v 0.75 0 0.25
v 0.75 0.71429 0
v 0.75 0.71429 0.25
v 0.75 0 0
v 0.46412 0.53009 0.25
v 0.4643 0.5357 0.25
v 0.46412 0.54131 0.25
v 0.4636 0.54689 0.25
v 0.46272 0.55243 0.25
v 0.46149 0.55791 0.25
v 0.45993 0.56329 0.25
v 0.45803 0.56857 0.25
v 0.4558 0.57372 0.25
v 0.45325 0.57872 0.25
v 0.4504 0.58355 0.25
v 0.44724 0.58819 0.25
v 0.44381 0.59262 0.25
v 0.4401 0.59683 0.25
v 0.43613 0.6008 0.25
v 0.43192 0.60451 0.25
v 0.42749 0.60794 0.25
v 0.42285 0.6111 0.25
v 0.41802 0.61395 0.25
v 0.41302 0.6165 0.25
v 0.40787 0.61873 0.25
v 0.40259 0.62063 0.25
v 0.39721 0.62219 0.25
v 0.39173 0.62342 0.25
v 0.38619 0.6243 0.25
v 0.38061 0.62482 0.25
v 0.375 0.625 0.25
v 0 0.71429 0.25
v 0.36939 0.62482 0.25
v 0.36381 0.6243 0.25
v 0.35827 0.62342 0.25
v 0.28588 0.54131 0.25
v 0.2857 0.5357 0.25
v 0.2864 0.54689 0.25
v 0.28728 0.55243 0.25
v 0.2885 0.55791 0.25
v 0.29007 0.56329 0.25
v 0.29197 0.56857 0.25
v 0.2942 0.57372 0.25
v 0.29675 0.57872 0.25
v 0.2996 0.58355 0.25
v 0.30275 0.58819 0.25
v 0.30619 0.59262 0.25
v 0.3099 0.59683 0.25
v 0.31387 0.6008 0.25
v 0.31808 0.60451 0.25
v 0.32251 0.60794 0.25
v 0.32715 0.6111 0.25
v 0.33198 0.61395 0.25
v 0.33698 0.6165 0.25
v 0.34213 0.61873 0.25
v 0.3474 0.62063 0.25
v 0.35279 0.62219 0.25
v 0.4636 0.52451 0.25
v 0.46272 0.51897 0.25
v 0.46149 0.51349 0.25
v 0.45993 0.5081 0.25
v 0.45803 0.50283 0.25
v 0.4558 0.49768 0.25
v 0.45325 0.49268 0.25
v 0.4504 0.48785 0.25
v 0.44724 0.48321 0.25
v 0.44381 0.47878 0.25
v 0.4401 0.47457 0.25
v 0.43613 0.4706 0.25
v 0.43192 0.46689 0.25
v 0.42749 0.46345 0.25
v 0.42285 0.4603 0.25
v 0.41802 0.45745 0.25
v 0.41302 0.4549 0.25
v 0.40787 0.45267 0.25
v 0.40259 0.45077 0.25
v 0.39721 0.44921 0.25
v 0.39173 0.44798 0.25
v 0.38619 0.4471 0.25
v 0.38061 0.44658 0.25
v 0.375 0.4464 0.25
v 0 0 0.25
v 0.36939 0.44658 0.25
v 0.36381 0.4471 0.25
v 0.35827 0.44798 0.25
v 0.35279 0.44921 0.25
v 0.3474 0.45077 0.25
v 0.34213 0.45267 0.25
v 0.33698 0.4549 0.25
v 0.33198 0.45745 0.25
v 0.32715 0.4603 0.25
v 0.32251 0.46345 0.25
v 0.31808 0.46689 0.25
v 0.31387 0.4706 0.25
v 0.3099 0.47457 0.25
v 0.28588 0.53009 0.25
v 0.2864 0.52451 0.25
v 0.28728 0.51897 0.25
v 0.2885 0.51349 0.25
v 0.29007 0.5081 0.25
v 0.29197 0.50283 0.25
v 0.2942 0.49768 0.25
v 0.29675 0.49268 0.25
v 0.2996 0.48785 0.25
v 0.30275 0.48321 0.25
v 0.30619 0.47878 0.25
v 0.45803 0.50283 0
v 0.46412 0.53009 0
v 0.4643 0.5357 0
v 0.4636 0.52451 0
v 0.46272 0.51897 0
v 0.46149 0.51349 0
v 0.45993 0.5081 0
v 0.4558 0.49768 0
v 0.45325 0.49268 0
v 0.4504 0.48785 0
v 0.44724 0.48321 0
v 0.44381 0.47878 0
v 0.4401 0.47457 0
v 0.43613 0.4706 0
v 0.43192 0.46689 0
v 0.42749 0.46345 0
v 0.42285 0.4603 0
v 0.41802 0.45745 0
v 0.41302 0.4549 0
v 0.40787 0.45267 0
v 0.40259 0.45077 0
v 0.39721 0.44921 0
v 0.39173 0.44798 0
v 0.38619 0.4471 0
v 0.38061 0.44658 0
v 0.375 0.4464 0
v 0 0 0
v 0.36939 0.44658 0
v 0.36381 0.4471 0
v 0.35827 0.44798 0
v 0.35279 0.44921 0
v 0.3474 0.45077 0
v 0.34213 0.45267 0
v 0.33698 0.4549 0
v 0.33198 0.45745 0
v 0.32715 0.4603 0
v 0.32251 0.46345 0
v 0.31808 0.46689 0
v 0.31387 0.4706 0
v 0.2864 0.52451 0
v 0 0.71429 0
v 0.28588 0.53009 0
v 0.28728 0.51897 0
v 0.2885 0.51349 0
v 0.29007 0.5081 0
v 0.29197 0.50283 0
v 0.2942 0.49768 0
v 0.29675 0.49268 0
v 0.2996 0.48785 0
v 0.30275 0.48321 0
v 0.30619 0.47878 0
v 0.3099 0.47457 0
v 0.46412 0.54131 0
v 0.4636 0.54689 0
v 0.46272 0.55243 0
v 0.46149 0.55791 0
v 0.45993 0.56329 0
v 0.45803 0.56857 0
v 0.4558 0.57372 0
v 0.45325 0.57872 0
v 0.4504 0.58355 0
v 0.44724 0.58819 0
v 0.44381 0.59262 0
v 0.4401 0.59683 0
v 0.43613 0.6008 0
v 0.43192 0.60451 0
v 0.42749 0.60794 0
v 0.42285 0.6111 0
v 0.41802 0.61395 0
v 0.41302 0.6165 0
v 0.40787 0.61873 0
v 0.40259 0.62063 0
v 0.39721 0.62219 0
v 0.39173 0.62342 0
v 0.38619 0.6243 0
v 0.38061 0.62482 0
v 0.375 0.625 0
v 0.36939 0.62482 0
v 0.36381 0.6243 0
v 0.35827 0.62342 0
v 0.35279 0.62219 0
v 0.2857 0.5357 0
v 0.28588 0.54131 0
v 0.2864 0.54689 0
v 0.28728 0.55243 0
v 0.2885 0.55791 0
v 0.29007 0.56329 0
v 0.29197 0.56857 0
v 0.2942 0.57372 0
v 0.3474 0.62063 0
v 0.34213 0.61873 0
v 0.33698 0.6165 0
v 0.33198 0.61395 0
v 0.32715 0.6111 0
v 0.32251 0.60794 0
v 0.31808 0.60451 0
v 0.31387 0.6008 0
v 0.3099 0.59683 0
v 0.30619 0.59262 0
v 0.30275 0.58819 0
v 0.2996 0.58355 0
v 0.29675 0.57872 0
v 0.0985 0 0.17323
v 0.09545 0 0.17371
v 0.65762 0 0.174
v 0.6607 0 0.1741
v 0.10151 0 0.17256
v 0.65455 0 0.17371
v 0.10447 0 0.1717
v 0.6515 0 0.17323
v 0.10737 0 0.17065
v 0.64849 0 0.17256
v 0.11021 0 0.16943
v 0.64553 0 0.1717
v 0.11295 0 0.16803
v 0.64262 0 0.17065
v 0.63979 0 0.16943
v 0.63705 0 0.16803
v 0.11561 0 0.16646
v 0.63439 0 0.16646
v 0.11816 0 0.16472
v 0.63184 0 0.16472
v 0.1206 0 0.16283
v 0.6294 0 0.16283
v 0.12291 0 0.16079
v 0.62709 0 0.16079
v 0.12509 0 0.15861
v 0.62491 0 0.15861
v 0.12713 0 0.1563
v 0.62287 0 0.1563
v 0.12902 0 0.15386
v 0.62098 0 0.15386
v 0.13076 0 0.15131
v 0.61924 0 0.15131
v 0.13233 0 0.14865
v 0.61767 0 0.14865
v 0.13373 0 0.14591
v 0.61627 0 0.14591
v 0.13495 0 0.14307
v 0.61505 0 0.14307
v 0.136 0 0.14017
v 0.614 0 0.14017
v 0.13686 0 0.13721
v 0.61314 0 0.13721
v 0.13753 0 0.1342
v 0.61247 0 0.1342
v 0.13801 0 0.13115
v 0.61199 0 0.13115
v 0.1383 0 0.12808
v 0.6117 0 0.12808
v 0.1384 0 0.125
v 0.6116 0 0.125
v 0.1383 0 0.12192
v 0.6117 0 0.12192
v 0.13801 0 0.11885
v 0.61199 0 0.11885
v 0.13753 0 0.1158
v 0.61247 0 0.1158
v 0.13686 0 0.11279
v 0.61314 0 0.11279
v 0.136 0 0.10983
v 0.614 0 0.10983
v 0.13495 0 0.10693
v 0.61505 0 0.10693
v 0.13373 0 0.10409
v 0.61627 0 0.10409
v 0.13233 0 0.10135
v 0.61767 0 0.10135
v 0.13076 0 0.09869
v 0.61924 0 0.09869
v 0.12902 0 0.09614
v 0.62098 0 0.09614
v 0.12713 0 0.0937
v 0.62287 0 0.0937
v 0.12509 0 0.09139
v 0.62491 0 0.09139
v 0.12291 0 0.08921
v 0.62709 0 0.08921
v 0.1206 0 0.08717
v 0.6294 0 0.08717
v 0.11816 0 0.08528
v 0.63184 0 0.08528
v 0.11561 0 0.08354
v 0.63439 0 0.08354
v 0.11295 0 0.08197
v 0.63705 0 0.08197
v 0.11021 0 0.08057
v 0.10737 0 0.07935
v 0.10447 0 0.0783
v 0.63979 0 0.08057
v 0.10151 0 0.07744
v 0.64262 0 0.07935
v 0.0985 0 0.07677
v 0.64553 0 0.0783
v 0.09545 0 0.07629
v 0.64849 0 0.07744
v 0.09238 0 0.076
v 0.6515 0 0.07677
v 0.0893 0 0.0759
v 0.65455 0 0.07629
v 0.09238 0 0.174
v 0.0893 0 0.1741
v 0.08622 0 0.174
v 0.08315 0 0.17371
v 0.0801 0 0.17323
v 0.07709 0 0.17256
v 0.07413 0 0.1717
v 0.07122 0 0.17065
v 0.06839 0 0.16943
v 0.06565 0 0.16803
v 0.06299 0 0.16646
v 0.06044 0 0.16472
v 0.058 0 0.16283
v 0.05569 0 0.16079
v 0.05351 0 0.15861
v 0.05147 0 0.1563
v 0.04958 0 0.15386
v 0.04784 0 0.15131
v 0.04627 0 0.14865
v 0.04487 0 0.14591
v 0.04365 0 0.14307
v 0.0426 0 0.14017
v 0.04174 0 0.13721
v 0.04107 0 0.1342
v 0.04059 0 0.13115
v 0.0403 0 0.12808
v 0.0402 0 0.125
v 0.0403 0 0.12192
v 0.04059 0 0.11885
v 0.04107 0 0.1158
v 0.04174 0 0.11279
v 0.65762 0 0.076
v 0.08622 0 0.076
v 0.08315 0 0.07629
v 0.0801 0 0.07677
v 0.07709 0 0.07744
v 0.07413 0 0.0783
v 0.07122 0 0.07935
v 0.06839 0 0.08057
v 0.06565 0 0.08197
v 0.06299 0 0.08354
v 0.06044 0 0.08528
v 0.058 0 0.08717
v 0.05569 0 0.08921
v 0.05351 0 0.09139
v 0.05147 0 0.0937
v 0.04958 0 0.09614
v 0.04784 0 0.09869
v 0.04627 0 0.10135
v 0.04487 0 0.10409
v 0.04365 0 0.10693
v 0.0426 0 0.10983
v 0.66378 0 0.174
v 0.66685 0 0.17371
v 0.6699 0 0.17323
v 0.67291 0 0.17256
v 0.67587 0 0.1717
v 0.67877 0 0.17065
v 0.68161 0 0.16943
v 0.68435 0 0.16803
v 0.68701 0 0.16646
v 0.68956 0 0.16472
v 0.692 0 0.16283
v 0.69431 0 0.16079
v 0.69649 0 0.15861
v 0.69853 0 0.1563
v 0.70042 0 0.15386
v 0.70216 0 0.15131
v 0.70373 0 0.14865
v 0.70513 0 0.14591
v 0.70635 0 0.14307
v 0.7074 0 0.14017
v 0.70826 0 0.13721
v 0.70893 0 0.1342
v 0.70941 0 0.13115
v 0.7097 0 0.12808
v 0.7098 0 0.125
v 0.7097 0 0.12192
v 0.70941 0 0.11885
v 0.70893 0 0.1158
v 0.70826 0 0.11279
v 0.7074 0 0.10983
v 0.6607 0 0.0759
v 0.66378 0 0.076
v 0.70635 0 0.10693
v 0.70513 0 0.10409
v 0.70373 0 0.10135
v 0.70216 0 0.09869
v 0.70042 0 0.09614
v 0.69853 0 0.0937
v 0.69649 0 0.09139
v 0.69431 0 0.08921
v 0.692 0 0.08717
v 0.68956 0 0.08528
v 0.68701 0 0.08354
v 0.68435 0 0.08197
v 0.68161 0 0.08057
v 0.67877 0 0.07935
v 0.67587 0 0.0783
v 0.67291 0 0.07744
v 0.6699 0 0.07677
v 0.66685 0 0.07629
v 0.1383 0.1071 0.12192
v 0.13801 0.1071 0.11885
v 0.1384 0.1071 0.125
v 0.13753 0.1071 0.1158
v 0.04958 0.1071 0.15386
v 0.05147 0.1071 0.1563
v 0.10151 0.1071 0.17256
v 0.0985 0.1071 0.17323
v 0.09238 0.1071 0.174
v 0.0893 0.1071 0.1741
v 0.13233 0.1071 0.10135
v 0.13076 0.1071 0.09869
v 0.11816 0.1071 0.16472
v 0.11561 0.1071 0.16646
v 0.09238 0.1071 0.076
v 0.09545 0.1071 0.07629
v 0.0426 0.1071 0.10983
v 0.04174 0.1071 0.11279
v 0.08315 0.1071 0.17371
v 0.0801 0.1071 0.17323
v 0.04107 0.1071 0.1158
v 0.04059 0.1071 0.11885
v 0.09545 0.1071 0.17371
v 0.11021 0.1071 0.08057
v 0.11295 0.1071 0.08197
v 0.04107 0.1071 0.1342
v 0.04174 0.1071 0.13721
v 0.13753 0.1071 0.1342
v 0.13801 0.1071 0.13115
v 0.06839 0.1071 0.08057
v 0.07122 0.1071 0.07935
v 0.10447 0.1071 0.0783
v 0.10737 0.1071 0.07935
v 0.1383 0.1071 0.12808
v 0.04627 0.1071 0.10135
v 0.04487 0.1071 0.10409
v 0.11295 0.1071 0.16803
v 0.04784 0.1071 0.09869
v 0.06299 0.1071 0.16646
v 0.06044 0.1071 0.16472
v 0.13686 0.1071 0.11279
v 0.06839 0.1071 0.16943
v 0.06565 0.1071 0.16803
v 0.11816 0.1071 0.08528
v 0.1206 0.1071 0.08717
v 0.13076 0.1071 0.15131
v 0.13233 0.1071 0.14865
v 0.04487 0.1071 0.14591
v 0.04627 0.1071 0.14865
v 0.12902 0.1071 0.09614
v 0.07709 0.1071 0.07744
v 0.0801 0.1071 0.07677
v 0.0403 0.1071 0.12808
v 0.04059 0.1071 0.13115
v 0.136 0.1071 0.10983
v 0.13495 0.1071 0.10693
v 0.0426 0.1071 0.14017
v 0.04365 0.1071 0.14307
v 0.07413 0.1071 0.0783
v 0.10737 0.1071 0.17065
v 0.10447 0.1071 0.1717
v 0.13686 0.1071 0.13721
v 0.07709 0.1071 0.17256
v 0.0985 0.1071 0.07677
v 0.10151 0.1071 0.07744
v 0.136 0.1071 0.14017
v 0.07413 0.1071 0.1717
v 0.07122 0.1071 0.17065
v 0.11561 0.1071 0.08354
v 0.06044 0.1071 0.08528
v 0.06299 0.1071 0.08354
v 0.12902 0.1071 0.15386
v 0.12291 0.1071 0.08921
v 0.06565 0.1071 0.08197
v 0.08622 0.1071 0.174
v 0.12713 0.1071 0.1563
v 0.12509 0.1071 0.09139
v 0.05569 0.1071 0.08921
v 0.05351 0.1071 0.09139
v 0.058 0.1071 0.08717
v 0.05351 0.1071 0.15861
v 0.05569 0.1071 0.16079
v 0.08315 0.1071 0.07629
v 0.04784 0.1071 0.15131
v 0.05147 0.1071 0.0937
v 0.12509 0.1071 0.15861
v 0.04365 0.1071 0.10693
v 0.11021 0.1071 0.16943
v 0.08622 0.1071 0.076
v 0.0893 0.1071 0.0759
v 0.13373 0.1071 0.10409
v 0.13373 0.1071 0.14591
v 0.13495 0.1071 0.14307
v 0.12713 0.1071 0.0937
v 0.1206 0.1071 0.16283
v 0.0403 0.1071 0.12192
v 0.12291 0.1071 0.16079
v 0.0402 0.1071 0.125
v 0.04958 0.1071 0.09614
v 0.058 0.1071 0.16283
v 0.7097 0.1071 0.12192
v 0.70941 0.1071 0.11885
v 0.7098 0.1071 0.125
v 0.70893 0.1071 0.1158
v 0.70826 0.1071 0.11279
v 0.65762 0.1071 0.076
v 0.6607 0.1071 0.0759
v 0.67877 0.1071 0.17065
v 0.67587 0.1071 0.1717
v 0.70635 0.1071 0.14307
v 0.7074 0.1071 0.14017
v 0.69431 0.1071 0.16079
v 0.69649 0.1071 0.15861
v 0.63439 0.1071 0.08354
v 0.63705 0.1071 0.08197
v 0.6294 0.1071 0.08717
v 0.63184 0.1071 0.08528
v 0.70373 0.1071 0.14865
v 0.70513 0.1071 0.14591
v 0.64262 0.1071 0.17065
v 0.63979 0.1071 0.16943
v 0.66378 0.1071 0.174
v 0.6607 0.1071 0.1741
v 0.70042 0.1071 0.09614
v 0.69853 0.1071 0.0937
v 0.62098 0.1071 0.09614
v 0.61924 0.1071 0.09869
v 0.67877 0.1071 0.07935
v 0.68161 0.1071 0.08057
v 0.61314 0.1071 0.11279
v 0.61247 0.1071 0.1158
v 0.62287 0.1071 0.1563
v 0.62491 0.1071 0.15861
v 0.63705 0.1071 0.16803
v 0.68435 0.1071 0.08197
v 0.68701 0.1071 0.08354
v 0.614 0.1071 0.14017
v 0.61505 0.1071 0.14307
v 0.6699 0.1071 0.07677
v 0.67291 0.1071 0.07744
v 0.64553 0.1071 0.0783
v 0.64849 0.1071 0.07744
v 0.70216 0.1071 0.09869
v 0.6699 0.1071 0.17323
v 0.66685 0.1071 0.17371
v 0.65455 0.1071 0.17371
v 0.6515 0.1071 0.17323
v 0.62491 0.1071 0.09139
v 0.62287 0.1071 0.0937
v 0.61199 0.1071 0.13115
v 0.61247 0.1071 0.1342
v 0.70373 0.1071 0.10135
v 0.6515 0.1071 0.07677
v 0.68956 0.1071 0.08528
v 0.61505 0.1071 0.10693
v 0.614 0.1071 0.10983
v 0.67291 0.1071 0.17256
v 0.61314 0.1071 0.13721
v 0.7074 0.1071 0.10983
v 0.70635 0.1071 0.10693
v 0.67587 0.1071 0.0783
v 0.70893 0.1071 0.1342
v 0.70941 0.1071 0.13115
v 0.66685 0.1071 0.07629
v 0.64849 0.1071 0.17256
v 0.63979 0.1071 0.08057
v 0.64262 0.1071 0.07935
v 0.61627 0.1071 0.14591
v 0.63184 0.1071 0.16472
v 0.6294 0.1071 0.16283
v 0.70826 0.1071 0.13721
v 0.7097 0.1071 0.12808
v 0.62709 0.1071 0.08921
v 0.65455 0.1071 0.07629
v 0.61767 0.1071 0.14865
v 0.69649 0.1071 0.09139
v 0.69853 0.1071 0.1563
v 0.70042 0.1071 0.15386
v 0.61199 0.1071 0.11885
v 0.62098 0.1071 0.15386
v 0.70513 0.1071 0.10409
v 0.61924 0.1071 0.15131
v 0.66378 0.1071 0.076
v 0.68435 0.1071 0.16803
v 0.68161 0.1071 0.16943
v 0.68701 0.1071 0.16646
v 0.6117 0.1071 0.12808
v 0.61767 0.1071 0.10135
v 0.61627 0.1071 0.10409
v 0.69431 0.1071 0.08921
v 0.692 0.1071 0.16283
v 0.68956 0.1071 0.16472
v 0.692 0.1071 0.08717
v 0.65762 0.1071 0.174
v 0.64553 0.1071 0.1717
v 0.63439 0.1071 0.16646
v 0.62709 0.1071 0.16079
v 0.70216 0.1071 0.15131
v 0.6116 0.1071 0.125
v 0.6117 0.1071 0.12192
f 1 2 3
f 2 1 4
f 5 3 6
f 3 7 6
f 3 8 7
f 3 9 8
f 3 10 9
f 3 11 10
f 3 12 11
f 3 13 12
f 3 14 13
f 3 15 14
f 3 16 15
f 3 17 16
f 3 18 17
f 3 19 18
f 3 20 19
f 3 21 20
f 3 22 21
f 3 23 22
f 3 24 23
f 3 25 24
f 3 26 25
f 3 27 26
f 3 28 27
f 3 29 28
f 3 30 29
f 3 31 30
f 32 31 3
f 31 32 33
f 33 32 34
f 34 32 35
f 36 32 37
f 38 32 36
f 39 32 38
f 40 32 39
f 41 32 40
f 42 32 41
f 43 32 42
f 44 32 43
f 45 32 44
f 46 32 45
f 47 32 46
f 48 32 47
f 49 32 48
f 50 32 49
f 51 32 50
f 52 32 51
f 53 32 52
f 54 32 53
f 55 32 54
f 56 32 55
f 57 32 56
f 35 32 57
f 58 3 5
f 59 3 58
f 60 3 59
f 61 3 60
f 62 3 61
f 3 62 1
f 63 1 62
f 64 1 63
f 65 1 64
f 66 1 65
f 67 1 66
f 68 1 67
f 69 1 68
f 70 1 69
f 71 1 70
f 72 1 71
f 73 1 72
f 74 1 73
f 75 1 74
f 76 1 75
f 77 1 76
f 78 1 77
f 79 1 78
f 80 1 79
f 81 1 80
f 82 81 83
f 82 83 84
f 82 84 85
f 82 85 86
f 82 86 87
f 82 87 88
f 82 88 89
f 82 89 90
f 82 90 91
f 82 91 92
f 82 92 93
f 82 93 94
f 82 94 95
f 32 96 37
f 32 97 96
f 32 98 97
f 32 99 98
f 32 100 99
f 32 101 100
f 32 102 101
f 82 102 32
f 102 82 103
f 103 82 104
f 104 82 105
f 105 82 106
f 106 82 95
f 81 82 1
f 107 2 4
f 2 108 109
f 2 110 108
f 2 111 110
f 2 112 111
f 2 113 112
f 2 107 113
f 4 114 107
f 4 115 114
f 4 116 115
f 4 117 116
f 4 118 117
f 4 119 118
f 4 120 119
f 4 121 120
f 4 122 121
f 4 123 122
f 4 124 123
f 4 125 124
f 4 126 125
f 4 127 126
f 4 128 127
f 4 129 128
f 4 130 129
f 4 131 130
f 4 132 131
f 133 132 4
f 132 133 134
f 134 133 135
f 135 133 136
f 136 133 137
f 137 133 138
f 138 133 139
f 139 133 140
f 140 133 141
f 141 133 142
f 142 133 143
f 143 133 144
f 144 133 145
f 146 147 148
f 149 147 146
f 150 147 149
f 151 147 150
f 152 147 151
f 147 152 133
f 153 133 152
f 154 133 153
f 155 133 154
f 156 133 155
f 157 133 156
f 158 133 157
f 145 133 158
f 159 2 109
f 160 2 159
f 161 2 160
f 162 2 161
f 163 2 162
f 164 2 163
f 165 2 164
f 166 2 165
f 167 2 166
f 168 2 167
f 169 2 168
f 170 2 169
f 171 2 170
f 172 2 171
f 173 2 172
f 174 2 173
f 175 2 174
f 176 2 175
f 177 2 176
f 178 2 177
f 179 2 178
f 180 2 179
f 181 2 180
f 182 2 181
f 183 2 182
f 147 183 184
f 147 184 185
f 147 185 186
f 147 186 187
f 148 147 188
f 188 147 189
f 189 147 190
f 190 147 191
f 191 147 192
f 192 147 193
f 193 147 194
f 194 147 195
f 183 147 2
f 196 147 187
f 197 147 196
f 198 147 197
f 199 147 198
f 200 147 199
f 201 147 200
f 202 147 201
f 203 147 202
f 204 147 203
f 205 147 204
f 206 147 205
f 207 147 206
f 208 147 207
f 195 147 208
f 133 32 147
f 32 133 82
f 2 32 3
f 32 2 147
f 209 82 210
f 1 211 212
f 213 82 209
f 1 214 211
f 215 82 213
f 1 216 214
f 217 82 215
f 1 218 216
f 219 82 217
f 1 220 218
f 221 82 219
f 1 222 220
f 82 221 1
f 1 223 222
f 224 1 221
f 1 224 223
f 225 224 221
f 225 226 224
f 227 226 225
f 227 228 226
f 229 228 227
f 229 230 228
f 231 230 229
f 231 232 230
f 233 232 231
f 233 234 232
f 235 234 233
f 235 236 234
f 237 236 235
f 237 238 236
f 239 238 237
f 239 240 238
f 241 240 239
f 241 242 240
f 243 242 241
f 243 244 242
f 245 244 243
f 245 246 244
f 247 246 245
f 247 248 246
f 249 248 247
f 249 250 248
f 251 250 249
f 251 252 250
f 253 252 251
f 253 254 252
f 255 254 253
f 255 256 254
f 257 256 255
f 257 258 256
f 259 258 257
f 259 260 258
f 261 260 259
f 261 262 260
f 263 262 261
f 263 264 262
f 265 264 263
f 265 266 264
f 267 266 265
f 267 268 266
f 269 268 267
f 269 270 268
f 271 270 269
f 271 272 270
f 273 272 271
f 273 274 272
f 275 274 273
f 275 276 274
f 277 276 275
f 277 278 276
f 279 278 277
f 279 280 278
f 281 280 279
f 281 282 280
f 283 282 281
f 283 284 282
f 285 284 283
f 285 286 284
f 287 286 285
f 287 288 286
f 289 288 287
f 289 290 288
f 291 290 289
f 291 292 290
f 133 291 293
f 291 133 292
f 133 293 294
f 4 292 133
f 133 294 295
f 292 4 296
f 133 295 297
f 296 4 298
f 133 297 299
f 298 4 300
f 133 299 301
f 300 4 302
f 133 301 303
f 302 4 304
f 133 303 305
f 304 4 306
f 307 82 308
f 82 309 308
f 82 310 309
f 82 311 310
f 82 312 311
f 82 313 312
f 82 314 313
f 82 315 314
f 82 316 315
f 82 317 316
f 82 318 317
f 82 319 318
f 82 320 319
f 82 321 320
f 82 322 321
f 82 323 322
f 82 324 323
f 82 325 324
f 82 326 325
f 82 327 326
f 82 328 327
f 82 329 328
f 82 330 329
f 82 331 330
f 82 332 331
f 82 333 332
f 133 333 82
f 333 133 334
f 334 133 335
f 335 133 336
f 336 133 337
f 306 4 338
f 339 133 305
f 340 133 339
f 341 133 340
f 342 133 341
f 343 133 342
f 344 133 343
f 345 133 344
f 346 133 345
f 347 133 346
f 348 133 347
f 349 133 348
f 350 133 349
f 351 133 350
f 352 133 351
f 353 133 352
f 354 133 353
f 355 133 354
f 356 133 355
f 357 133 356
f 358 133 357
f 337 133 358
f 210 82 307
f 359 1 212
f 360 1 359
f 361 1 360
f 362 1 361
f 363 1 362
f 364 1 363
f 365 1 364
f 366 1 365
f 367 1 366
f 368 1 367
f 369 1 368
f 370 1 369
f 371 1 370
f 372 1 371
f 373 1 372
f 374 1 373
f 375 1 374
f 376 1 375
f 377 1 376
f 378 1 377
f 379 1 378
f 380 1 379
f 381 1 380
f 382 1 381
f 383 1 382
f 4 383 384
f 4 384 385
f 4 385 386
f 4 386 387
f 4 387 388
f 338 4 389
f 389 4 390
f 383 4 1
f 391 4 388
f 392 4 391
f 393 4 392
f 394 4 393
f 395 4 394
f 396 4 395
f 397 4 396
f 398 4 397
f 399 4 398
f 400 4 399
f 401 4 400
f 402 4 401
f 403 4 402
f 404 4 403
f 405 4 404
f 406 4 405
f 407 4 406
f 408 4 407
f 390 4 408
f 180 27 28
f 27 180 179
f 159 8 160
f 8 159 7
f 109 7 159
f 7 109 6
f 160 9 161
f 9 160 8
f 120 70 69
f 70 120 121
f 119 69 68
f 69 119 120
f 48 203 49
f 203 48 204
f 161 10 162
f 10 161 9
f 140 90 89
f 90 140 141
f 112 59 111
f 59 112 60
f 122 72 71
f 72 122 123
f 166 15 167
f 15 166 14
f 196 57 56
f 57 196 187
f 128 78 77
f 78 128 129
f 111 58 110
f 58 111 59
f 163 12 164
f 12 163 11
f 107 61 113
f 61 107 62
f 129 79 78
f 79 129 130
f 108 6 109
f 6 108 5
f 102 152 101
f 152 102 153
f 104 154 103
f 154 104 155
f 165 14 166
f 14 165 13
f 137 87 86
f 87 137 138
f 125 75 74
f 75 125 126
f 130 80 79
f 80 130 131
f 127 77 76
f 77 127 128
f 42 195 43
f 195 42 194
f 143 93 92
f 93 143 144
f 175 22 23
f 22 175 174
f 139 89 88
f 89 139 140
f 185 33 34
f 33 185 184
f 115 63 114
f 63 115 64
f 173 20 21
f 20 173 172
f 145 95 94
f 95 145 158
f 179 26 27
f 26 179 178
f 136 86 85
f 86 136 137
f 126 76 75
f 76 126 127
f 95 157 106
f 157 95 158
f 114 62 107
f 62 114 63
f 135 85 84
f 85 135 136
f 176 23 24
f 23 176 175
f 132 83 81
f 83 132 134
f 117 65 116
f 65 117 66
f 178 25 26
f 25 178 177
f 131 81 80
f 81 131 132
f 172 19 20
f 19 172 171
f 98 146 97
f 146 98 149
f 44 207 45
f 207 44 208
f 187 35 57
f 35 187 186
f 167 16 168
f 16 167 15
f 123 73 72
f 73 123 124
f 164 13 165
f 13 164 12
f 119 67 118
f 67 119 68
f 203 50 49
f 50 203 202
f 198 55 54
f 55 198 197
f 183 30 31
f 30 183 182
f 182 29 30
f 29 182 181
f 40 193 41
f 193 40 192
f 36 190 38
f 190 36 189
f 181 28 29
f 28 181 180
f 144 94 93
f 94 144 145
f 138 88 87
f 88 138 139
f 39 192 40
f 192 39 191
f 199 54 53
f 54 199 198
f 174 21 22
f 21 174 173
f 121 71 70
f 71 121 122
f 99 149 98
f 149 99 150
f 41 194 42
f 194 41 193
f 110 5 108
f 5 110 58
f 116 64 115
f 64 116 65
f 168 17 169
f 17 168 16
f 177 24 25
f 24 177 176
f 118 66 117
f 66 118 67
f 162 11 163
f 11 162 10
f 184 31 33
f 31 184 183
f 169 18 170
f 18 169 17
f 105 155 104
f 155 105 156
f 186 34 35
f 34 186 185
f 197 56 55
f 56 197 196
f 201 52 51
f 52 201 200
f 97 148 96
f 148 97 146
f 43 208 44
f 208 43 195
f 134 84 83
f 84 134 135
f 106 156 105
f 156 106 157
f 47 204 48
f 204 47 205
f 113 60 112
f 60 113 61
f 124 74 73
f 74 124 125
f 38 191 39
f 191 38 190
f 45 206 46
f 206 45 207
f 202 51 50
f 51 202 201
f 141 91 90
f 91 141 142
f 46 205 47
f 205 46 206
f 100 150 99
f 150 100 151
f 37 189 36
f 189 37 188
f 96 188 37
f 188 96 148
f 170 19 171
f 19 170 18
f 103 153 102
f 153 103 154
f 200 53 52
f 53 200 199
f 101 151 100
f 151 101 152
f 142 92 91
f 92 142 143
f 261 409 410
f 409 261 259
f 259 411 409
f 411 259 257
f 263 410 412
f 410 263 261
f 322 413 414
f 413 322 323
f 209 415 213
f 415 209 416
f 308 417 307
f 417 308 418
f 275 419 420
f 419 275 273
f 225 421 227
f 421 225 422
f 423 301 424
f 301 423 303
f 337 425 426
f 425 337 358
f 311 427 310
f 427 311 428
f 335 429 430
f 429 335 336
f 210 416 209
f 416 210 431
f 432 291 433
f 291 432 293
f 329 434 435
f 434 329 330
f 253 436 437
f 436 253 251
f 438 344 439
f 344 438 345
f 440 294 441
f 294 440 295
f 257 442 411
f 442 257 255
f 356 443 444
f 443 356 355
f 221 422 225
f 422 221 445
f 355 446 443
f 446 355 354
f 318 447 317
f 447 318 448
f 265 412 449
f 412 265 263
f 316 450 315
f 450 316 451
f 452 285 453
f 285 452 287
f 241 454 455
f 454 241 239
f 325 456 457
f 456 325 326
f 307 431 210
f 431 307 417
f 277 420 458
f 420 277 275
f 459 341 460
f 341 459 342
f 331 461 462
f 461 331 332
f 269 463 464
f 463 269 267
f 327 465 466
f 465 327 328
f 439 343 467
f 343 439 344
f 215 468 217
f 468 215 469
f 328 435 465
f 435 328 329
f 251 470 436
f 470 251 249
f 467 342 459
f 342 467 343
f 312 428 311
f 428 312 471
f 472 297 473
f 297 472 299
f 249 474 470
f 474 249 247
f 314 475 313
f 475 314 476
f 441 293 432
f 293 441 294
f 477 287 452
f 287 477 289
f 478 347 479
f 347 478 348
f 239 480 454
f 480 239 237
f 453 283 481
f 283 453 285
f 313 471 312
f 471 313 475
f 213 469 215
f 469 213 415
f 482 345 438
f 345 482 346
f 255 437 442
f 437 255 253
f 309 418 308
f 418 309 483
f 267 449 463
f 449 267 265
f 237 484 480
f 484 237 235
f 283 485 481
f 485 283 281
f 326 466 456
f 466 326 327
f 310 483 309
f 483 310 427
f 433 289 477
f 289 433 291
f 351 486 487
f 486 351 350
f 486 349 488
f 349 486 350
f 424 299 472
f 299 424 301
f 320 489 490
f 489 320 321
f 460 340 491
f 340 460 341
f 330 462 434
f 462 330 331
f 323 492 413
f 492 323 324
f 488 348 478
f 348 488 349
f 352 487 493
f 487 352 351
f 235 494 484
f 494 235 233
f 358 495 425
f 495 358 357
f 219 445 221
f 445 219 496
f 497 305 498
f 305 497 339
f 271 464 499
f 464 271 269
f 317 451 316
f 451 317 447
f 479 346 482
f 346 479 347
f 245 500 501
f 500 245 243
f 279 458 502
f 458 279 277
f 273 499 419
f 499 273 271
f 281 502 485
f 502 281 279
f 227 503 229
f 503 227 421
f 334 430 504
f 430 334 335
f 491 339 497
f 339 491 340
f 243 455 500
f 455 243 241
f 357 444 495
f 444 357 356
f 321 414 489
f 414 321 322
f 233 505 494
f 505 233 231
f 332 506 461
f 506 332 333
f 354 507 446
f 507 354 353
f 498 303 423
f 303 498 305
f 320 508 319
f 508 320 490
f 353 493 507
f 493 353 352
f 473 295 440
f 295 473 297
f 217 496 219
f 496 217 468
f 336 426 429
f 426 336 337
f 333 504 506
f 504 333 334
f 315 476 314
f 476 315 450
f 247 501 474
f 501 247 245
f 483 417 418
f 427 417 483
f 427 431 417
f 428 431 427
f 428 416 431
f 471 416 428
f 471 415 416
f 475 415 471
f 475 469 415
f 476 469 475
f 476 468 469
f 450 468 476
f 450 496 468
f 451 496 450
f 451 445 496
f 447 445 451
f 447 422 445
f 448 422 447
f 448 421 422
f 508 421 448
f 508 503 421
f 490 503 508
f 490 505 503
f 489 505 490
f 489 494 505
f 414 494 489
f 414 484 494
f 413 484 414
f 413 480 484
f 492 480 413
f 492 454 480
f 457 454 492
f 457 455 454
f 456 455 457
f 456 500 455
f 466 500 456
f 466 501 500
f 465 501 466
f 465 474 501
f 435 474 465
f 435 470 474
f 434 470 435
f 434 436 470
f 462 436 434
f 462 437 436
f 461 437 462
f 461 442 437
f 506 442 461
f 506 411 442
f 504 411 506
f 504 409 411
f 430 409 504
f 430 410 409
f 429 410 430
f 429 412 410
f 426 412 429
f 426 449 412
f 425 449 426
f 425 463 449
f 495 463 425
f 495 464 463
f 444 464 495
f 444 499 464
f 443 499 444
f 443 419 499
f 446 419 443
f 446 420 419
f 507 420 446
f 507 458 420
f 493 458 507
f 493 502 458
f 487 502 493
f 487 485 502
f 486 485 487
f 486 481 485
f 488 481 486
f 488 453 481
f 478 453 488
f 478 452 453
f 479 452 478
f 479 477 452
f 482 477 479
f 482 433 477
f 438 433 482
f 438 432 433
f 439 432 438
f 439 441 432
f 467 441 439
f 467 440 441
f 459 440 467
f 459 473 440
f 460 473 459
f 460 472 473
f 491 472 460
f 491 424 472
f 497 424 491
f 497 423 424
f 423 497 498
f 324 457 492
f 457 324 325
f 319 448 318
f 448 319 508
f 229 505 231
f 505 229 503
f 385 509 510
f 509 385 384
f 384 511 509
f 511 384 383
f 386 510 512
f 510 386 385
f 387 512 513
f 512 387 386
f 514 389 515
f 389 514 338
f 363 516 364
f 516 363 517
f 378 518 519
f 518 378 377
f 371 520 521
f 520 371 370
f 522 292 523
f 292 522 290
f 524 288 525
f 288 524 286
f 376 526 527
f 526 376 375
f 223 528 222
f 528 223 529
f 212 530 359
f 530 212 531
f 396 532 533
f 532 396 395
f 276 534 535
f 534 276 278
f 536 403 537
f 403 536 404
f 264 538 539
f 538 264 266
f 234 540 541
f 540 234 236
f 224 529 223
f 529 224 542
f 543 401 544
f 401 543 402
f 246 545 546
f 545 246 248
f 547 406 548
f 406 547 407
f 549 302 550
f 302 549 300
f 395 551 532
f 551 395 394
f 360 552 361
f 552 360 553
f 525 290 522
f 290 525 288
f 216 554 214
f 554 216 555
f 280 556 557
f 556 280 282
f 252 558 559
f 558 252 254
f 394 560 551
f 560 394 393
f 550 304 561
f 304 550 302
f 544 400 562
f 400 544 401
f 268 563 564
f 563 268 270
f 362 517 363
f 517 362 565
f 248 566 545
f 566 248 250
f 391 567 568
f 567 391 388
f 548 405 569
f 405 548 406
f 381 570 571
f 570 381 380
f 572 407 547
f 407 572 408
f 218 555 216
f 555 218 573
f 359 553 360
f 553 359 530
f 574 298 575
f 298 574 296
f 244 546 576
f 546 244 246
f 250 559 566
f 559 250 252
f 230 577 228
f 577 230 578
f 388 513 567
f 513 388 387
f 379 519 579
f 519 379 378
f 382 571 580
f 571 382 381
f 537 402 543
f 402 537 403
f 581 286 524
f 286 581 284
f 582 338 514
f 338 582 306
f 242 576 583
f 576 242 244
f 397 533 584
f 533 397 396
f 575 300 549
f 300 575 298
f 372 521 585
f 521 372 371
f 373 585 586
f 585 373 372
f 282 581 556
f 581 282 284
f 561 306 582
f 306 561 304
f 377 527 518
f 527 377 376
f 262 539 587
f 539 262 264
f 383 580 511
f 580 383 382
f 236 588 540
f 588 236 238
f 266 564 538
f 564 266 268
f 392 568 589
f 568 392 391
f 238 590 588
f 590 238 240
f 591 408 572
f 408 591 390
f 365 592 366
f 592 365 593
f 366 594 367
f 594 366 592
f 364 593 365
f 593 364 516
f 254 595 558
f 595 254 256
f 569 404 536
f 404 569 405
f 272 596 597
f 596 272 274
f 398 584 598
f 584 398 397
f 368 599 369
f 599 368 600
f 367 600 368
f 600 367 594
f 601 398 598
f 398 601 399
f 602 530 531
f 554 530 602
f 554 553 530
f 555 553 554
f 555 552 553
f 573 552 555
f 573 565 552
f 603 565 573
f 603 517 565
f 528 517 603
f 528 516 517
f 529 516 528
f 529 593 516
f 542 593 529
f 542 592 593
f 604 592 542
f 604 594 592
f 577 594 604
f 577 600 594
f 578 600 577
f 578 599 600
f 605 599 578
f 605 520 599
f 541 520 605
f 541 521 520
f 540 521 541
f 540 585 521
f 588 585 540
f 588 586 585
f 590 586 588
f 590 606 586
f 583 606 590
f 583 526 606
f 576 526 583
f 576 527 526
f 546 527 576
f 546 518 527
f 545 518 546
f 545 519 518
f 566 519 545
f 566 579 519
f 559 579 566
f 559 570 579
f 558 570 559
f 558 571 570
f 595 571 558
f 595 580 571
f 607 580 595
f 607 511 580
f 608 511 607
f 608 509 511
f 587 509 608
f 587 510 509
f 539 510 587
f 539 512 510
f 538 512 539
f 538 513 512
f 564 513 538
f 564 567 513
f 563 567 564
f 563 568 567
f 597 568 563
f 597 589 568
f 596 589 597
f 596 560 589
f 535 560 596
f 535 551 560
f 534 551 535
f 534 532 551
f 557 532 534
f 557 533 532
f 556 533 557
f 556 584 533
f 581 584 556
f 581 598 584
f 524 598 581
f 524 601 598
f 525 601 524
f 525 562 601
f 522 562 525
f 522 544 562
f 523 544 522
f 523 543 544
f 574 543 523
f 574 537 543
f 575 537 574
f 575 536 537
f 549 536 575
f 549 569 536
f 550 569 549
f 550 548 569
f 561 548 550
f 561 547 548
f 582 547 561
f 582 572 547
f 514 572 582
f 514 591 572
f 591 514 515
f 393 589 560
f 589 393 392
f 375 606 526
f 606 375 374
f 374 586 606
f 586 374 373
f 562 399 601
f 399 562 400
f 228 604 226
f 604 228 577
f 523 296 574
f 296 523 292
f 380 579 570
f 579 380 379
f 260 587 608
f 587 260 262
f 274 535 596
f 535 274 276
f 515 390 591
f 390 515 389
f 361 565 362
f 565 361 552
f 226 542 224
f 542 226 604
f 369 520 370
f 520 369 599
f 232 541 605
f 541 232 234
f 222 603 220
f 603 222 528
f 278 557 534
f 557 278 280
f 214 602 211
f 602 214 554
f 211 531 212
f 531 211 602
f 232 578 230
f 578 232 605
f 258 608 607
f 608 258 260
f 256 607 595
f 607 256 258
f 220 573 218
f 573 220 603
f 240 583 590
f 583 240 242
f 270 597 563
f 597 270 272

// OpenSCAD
// Parameters
length = 0.75;
width = 0.714286;
height = 0.25;

// Upper through-opening parameters
hole_x = 0.375;
hole_y = 0.5357;
hole_r = 0.0893;

// Front side face removed features parameters
front_cut_x1 = 0.0893;
front_cut_x2 = 0.6607;
front_cut_r = 0.0491;
front_cut_depth = 0.1071;
// Z-axis derived from the circular band limits (0.0759 to 0.1741)
front_cut_z = (0.0759 + 0.1741) / 2; 

// Resolution and manifold tolerance
$fn = 100;
eps = 0.001;

// Reusable module for the main solid body
module main_body() {
    // Generates the overall bounding block for the stepped, line-profiled body
    // based on the provided overall maximum dimensions.
    cube([length, width, height]);
}

// Main model construction
difference() {
    // Base solid
    main_body();
    
    // Upper through-opening
    // Cuts completely through the Z-height of the main solid
    translate([hole_x, hole_y, -eps])
        cylinder(h=height + 2*eps, r=hole_r);
        
    // Left front circular removed feature
    // Blind cylindrical cut into the body from the front edge (Y=0)
    translate([front_cut_x1, -eps, front_cut_z])
        rotate([-90, 0, 0])
        cylinder(h=front_cut_depth + eps, r=front_cut_r);
        
    // Right front circular removed feature
    // Blind cylindrical cut into the body from the front edge (Y=0)
    translate([front_cut_x2, -eps, front_cut_z])
        rotate([-90, 0, 0])
        cylinder(h=front_cut_depth + eps, r=front_cut_r);
}
